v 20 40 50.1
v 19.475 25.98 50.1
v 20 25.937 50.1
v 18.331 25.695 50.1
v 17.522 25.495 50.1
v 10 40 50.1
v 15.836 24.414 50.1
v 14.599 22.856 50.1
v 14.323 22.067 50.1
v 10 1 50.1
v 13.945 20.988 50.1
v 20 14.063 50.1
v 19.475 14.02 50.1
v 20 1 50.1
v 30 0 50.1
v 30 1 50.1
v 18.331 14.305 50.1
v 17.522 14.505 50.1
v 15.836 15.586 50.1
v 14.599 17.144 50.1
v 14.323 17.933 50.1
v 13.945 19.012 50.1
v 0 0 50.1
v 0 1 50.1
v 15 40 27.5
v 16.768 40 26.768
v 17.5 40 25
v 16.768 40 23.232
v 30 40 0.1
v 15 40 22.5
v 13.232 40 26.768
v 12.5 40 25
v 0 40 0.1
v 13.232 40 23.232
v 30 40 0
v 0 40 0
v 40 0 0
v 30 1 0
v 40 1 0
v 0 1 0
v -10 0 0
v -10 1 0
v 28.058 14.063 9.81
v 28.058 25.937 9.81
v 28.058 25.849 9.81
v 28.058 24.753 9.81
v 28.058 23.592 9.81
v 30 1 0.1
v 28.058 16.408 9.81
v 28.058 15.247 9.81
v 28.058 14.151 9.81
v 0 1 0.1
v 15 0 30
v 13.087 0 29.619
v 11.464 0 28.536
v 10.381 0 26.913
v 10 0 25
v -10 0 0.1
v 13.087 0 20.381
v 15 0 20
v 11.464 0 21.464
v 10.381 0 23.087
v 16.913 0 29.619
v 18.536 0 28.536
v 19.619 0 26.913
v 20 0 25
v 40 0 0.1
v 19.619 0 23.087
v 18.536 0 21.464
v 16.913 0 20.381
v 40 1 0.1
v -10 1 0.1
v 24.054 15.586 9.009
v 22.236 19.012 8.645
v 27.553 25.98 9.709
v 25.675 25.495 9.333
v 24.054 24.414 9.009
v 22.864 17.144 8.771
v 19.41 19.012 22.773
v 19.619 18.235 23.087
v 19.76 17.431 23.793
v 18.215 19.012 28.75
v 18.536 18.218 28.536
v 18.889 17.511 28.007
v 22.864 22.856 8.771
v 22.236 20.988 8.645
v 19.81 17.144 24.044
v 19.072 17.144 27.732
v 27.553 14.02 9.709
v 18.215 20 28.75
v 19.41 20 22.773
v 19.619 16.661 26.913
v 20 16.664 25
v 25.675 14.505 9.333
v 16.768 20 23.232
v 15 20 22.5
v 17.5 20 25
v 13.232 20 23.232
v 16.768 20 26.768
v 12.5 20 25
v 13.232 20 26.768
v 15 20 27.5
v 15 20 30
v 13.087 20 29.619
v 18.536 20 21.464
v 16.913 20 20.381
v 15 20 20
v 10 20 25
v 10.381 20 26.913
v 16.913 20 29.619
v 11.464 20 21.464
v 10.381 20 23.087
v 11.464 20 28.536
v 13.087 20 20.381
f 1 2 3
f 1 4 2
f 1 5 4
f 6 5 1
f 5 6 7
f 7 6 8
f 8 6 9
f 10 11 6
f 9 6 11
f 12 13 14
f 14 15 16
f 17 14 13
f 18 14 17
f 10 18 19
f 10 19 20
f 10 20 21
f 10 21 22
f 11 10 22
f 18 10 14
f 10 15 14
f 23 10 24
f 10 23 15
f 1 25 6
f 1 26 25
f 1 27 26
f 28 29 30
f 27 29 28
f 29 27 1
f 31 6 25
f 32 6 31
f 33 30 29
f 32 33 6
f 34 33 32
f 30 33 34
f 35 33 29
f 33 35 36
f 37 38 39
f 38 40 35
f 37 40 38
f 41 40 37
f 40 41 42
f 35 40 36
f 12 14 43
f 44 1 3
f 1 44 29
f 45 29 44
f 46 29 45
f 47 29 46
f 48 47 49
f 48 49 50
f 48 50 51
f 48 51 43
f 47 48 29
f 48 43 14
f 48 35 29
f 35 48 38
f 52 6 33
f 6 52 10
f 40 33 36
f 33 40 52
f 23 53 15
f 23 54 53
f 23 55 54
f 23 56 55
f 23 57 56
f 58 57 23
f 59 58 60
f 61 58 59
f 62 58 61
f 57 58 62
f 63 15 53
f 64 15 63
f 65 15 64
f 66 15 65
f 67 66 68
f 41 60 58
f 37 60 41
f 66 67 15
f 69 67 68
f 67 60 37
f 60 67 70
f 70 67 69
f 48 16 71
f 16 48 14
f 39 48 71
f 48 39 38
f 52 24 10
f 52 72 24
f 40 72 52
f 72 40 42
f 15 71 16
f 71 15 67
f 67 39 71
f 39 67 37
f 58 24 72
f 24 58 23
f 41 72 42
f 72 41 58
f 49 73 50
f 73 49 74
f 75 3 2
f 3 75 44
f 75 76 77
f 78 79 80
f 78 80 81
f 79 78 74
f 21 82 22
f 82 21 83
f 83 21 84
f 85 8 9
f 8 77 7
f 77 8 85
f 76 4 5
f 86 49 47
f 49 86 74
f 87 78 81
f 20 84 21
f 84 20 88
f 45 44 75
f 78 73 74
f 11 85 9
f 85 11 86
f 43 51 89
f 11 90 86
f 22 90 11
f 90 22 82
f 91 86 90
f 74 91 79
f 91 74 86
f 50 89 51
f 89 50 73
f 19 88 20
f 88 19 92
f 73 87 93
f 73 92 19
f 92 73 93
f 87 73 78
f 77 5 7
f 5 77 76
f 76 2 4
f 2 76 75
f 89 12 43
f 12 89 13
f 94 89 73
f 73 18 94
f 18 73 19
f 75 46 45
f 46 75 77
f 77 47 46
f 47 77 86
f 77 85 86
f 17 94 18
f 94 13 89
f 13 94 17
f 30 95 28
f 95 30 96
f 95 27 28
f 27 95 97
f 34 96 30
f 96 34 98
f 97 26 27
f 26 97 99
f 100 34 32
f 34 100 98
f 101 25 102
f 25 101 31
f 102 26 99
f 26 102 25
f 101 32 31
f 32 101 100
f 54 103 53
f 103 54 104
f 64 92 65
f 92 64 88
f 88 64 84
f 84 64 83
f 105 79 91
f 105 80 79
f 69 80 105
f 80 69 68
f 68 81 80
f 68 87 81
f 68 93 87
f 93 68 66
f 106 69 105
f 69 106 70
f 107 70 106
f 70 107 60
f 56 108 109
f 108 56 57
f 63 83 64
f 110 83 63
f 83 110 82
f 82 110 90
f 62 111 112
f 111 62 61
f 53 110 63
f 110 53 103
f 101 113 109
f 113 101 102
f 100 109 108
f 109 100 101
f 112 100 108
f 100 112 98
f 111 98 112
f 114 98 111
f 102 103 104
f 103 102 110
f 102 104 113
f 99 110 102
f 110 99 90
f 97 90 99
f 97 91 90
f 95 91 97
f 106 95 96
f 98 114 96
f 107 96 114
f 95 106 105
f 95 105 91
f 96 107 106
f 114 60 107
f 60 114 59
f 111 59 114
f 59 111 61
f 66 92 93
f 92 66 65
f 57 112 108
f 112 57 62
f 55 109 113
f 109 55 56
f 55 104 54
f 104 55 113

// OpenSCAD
width=40;

top_x=10;
bottom_x=30;

height=50;

pad=0.1;

lip=10;
lip_wall=1;

divot=12;

divot_angle=atan((bottom_x-top_x)/2/height);

on_switch=10;

screw=5;
led=10;
led_h=20;

module body() {
    hull() {
        cube([bottom_x,width,pad]);
        translate([bottom_x/2-top_x/2,0,height])
        cube([top_x,width,pad]);
    }

    translate([-lip,0,0])
    hull() {
        cube([bottom_x+lip*2,lip_wall,pad]);
        translate([bottom_x/2-top_x/2,0,height])
        cube([top_x+lip*2,lip_wall,pad]);
    }
}

difference() {
    body();

    translate([bottom_x,width/2,0])
    rotate([0,-divot_angle,0])
    translate([0,0,on_switch])
    cylinder(d=divot,h=height*2);

    translate([bottom_x/2,0,height/2])
    rotate([-90,0,0])
    cylinder(d=screw,h=width);

    translate([bottom_x/2,0,height/2])
    rotate([-90,0,0])
    cylinder(d=led,h=width/2);
}
